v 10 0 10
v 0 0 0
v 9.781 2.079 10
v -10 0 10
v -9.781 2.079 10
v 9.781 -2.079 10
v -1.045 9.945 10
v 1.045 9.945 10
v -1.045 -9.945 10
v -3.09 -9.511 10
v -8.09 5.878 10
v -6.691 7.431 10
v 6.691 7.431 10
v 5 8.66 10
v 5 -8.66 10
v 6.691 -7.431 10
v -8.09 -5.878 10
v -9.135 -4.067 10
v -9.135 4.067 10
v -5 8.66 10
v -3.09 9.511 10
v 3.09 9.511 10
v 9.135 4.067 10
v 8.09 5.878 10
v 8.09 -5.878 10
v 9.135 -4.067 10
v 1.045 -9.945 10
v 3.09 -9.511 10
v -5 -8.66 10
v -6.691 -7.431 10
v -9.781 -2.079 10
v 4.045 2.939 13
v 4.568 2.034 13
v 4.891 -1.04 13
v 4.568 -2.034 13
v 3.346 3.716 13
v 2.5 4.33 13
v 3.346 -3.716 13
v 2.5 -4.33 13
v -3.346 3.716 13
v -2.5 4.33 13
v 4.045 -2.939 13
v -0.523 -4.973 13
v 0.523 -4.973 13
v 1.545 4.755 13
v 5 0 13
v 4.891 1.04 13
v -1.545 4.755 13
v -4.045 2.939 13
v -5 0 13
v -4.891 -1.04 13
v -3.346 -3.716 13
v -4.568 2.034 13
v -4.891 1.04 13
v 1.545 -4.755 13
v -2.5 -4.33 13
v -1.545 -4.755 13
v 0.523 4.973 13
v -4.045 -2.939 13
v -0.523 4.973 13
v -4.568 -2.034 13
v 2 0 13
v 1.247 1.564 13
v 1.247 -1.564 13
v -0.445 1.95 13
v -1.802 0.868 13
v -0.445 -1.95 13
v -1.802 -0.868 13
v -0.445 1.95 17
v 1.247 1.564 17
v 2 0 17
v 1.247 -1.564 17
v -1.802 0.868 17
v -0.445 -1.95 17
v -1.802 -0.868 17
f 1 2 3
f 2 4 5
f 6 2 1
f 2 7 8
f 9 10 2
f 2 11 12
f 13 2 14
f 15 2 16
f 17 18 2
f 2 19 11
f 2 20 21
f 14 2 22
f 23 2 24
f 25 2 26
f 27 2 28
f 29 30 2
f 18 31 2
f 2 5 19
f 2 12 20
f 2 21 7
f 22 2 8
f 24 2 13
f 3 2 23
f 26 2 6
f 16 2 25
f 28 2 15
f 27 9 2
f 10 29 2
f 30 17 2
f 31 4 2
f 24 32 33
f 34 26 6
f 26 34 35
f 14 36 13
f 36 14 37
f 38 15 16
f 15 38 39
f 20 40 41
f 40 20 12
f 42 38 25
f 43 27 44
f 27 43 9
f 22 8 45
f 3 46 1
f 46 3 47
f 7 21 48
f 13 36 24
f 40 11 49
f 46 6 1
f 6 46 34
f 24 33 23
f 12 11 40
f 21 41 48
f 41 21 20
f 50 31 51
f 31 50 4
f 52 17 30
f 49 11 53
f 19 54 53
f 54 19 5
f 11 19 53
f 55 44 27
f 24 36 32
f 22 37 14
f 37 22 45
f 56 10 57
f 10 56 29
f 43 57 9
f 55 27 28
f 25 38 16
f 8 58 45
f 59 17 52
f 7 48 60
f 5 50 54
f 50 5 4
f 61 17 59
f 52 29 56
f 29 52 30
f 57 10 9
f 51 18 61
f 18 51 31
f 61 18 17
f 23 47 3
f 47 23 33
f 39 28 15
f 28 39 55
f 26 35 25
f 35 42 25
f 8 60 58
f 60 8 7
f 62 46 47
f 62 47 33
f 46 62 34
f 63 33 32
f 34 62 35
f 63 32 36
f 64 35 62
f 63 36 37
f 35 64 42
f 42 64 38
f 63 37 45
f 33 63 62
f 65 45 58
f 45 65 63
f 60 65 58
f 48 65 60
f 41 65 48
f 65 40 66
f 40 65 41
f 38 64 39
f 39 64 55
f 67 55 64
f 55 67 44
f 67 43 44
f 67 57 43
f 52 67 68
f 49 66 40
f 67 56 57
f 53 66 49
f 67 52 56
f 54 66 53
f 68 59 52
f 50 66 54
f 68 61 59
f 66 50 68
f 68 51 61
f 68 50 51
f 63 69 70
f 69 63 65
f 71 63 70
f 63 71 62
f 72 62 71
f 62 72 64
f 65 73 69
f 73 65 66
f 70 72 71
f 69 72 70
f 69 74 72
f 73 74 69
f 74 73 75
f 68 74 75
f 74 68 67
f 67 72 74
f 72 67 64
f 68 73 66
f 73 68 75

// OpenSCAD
// Bottom of Base
cylinder(10,0,10);

// Top of Base
translate([0,0,10]) cylinder(3,10,5);

// Top of Spinner
translate([0,0,13]) cylinder(4, 2, 2);
